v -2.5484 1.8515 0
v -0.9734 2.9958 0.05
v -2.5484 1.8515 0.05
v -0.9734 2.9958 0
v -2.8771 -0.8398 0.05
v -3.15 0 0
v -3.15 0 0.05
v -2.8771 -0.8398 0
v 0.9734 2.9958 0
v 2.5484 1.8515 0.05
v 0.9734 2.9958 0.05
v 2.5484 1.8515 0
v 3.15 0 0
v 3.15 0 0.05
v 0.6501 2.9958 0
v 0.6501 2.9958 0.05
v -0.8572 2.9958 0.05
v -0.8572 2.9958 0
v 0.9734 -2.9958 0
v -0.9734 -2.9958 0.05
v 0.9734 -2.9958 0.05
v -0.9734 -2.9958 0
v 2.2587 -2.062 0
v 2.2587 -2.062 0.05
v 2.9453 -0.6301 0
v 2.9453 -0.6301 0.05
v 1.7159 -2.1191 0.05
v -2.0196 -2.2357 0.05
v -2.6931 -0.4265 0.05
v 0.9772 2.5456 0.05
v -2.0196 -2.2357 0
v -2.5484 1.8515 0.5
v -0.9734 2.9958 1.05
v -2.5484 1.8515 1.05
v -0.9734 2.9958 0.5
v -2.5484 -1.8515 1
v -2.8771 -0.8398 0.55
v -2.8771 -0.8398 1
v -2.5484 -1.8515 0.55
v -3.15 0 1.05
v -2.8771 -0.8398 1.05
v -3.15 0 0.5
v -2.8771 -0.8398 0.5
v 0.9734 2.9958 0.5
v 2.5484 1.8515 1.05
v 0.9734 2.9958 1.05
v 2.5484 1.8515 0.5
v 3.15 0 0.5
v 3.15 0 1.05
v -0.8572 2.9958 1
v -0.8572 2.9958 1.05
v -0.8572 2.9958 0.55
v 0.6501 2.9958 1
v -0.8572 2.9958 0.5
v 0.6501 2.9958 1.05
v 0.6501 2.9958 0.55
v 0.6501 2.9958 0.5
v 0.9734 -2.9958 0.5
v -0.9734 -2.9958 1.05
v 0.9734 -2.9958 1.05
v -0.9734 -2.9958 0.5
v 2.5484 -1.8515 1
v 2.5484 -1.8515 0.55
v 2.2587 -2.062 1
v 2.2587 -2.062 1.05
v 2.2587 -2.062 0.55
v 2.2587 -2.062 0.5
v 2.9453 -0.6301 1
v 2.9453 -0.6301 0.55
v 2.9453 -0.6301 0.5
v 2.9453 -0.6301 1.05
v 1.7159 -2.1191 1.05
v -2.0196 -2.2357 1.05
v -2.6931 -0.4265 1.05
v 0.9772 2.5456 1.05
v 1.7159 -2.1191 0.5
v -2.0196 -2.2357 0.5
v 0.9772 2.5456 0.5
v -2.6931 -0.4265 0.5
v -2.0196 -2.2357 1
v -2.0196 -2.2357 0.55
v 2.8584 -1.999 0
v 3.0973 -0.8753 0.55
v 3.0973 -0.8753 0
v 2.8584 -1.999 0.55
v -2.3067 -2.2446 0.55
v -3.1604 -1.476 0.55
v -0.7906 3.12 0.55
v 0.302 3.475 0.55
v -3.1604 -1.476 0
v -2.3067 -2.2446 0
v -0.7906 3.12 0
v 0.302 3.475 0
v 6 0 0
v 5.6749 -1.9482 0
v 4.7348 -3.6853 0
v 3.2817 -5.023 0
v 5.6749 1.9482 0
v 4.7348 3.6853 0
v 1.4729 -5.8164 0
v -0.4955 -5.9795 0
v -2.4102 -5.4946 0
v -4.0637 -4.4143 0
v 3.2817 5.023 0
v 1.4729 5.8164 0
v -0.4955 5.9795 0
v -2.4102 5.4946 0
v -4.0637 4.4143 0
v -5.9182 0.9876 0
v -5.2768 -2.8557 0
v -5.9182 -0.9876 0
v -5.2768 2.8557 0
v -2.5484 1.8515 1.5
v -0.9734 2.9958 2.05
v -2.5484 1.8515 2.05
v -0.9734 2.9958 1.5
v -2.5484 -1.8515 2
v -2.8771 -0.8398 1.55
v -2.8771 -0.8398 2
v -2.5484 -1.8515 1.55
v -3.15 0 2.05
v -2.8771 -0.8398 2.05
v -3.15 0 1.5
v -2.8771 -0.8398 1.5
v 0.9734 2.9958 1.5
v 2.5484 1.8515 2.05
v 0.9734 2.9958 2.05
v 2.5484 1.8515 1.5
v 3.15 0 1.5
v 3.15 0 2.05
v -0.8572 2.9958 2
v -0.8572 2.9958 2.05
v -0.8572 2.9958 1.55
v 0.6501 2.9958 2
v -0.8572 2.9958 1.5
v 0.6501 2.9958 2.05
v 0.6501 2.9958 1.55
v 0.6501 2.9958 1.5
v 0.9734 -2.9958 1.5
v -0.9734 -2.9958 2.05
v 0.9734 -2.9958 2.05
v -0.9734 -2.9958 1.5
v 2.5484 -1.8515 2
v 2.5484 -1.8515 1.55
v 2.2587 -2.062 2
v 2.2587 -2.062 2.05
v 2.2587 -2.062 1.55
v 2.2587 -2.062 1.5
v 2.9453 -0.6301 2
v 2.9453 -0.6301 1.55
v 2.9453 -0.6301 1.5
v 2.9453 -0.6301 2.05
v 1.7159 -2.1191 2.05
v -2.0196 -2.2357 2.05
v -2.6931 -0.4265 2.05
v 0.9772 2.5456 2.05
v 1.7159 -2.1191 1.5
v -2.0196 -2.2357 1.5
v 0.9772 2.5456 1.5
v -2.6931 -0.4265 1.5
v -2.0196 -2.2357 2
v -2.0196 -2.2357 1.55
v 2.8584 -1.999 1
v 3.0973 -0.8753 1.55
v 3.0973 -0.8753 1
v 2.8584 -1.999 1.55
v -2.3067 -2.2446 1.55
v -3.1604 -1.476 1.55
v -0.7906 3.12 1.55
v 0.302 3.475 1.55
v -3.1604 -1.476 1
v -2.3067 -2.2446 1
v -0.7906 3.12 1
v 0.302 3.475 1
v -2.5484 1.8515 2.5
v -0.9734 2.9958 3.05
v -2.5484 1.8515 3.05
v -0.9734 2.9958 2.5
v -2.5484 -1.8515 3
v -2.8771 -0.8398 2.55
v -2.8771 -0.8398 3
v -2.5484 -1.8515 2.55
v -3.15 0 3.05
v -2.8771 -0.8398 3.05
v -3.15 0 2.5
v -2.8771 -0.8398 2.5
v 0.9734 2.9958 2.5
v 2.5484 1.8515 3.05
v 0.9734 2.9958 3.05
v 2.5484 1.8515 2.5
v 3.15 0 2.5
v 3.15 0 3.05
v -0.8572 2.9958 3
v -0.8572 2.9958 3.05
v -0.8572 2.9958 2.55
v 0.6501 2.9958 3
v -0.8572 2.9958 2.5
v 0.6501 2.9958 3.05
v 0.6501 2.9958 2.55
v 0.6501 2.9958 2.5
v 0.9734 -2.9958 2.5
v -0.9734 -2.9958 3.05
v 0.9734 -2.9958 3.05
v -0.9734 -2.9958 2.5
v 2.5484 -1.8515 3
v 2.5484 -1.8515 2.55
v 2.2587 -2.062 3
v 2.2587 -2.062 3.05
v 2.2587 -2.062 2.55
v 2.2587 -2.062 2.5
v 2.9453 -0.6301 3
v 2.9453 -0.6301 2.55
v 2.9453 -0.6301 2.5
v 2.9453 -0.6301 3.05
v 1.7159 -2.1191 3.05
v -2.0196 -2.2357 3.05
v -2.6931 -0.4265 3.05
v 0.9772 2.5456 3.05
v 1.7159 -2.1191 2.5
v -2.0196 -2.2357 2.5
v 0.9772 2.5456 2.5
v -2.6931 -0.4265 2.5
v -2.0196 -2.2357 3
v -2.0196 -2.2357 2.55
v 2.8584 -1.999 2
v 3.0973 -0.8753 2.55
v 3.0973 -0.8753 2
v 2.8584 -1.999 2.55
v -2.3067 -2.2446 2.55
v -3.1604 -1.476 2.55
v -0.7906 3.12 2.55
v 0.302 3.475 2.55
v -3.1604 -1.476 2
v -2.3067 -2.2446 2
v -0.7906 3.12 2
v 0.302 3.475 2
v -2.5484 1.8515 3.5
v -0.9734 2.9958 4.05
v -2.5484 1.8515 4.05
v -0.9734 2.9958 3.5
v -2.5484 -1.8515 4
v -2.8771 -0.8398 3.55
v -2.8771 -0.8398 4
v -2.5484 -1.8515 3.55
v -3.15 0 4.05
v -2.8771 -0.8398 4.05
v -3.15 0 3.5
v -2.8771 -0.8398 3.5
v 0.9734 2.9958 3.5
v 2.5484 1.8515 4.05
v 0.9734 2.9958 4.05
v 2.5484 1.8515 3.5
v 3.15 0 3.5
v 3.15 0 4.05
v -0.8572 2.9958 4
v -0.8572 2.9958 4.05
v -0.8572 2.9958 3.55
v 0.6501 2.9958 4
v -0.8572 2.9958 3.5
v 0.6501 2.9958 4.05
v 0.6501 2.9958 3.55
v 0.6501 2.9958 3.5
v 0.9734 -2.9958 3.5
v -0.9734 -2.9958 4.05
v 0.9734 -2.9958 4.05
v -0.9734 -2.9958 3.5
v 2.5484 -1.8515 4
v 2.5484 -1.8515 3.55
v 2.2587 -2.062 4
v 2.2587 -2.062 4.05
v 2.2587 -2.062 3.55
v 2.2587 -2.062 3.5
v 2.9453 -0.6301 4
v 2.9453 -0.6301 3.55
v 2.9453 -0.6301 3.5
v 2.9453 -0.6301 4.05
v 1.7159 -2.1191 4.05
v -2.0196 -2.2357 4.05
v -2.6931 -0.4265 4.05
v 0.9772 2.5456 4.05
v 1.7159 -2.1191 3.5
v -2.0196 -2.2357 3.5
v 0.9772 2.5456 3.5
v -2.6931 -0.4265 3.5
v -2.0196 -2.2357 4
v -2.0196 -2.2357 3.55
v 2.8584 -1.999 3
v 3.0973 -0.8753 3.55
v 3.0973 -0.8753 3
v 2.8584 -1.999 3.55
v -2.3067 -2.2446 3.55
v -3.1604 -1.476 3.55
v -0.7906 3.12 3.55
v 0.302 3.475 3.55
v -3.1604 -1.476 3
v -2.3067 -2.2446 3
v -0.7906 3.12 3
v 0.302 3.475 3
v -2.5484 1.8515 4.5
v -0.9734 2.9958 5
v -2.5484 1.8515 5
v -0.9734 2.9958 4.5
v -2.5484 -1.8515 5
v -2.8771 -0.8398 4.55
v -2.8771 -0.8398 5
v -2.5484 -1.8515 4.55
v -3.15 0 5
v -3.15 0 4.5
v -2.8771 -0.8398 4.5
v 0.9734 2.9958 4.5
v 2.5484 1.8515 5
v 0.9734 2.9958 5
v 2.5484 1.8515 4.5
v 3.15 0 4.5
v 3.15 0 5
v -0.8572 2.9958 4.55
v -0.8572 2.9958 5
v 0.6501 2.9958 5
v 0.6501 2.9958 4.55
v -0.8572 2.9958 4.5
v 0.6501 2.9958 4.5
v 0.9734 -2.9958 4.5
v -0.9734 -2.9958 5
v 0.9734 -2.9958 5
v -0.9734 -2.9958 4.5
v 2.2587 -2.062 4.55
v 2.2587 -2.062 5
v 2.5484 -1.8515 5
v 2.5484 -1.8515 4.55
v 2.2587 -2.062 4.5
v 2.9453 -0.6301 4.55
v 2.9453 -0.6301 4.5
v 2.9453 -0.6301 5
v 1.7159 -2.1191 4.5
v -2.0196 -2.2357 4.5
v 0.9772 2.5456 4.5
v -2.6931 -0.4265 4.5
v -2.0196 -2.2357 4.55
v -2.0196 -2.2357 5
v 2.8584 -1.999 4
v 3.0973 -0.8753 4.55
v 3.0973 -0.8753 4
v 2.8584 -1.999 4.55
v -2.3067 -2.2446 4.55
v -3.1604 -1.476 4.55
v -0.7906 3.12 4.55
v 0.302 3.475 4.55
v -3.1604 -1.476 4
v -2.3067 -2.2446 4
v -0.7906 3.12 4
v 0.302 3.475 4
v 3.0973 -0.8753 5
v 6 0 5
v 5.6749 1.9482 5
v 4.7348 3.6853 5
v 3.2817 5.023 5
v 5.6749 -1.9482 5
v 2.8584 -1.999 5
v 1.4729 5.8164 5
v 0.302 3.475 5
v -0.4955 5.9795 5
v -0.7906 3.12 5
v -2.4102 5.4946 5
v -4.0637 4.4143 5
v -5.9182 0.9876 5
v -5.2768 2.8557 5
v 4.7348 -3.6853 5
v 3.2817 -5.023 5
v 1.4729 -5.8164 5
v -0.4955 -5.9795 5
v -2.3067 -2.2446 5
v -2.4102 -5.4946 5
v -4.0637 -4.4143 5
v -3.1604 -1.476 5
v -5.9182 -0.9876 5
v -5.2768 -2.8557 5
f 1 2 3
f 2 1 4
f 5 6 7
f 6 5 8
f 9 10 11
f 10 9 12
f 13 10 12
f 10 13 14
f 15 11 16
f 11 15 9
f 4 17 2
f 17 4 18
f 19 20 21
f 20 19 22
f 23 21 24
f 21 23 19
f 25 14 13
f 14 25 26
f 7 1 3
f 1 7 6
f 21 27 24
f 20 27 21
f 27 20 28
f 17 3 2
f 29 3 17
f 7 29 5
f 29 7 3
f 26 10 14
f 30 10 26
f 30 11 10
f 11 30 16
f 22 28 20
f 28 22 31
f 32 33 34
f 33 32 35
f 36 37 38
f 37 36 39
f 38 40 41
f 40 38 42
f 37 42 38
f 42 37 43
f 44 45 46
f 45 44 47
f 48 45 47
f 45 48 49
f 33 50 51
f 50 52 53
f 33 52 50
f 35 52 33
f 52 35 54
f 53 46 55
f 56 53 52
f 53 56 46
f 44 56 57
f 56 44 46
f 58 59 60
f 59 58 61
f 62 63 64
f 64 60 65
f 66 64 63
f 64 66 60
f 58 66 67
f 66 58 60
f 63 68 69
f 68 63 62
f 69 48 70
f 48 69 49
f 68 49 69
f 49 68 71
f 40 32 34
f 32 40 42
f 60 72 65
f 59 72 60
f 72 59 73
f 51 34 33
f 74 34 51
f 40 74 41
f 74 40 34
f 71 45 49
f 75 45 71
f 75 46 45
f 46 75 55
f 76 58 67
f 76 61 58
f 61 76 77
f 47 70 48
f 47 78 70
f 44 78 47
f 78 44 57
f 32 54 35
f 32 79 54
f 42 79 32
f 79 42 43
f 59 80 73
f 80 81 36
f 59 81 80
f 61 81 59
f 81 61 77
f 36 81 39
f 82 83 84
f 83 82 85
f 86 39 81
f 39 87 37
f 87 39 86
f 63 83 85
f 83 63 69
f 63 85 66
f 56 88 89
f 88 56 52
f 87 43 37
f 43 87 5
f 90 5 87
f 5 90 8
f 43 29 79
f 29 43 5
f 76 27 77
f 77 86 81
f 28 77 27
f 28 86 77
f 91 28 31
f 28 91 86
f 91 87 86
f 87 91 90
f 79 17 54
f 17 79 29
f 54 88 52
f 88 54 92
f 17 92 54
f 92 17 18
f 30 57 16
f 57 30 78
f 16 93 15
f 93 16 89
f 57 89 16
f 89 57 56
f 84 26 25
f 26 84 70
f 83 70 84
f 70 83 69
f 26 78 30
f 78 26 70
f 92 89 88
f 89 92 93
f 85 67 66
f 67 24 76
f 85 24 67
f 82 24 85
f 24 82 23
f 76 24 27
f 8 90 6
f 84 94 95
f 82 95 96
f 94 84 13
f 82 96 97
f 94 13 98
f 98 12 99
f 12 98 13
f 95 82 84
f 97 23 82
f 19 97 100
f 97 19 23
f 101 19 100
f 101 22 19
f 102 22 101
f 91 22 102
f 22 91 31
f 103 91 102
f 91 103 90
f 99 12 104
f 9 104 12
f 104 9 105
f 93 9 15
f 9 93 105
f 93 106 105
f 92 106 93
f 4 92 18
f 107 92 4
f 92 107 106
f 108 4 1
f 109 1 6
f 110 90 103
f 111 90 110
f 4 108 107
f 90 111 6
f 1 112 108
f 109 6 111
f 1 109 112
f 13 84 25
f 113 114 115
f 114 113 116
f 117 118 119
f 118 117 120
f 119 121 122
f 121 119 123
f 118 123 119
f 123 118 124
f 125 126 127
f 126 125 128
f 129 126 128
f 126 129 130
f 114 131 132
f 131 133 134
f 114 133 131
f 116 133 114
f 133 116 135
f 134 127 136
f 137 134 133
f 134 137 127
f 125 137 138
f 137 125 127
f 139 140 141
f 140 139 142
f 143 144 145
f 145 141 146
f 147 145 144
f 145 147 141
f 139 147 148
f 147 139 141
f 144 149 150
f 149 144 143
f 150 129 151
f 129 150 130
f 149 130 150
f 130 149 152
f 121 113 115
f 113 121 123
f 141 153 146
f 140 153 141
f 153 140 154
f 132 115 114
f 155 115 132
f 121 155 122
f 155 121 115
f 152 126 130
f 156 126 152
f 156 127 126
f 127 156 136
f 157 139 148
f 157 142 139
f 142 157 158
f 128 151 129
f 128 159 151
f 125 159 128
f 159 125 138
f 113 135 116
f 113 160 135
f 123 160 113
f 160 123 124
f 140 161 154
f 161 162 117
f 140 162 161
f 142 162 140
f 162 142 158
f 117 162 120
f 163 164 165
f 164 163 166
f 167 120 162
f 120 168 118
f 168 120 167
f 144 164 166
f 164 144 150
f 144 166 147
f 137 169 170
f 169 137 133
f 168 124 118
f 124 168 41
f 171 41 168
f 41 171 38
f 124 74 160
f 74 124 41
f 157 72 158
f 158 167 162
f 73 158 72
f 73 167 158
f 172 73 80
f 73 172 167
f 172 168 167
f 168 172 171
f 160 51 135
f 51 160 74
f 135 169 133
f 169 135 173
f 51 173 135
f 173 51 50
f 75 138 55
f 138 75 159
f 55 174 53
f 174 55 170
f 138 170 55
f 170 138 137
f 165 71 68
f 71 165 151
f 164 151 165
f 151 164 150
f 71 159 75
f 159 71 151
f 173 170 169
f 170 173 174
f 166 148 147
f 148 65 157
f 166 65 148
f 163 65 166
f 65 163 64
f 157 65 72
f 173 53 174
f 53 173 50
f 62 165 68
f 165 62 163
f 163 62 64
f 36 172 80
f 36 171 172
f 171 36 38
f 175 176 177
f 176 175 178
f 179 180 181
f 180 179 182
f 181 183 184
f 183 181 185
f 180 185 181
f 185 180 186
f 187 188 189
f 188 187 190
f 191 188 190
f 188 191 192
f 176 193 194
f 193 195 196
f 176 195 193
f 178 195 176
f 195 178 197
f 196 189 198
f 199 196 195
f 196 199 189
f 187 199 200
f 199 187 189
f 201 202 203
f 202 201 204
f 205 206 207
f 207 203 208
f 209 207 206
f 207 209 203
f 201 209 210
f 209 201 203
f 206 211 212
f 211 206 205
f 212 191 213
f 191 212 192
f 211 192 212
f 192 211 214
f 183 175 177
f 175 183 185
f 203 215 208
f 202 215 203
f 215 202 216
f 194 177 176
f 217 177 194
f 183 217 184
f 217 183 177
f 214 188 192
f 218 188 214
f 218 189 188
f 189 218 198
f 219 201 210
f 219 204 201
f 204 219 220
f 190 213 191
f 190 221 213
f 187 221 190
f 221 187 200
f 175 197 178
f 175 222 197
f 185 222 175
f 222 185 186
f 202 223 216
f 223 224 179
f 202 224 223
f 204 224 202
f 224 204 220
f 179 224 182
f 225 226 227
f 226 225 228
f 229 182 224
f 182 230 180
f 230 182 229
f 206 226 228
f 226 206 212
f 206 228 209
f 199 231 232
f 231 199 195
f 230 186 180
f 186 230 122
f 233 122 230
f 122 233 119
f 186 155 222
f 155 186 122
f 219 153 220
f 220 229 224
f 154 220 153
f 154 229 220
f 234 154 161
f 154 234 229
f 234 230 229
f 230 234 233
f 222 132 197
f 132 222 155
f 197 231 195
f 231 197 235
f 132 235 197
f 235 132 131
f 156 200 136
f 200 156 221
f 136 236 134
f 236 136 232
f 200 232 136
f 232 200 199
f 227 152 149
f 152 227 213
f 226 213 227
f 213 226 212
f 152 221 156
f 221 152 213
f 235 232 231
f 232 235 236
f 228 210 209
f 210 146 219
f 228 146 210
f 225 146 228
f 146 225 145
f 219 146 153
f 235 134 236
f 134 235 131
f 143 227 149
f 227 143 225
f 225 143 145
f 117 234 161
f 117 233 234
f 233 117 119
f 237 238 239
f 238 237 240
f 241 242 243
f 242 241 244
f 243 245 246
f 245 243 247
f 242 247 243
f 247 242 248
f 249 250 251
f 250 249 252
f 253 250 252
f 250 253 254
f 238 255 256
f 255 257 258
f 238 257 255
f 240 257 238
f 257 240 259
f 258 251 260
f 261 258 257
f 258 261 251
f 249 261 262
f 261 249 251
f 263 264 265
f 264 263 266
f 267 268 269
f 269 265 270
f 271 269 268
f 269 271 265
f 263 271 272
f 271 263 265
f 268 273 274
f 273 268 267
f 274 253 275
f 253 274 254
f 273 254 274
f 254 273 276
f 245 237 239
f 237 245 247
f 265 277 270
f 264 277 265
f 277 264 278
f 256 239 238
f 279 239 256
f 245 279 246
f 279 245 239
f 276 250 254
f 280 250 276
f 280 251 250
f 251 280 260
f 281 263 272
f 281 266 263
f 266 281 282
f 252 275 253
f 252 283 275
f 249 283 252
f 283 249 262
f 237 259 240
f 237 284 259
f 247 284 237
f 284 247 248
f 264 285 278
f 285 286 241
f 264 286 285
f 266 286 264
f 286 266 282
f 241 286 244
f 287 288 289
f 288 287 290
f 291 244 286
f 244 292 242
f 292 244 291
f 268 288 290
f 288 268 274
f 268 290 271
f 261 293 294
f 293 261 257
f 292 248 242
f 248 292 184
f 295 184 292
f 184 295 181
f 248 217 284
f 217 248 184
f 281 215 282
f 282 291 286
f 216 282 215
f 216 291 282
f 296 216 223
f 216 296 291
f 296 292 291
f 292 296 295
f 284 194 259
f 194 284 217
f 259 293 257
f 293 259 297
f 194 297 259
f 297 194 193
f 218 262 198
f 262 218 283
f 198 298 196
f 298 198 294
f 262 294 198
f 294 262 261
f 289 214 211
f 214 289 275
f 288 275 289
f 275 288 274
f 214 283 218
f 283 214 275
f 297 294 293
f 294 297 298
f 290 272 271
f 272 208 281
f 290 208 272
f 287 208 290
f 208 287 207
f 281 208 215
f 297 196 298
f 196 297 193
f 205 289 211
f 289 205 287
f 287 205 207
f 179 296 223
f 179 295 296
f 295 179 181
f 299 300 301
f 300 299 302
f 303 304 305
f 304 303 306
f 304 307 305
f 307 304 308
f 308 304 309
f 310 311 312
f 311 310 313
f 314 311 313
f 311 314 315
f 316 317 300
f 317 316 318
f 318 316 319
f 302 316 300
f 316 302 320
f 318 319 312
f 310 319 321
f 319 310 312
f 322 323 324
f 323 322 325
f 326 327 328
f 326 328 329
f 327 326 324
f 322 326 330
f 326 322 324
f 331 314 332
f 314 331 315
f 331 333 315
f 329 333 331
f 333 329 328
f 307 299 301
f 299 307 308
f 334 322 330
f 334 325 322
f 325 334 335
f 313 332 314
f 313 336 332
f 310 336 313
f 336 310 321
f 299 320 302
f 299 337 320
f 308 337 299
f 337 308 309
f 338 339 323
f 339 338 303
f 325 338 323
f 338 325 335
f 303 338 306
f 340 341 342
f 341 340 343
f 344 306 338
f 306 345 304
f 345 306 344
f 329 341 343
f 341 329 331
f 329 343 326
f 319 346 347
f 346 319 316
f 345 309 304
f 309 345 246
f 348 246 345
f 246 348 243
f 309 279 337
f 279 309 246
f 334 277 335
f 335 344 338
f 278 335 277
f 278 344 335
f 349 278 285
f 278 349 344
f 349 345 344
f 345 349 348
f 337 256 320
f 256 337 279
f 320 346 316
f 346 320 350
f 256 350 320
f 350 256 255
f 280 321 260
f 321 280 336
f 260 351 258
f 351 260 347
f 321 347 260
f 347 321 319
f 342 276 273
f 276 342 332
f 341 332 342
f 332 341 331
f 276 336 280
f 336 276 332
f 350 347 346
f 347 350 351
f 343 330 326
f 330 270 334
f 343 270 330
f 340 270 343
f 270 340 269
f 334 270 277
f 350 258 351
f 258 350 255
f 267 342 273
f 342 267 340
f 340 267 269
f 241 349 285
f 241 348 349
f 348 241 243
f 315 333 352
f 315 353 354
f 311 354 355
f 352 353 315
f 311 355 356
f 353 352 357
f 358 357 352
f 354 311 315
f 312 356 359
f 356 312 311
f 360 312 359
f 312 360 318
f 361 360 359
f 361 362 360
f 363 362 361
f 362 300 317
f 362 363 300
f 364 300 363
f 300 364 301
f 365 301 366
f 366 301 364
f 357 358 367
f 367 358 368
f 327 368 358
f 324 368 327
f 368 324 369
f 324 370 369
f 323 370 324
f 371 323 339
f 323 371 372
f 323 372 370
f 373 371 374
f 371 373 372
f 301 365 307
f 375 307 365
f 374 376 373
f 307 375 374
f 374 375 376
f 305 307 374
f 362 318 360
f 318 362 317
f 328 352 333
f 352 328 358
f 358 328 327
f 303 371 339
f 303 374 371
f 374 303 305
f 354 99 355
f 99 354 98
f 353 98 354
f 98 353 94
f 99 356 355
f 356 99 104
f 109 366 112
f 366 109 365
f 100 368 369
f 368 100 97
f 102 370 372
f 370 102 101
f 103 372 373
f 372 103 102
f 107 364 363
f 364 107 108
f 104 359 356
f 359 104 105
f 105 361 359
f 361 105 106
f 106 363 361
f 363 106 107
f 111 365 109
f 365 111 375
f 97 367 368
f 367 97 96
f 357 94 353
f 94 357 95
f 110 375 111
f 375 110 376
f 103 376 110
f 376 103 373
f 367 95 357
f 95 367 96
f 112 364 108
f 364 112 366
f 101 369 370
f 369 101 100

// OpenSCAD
/******************************************************************
*                                                                 *
* OpenFlexure Microscope: OpenSCAD Utility functions              *
*                                                                 *
* This is part of the OpenFlexure microscope, an open-source      *
* microscope and 3-axis translation stage.  It gets really good   *
* precision over a ~10mm range, by using plastic flexure          *
* mechanisms.                                                     *
*                                                                 *
* (c) Richard Bowman, January 2016                                *
* Released under the CERN Open Hardware License                   *
*                                                                 *
******************************************************************/


//utilities

d=0.05;

function zeroz(size) = [size[0], size[1], 0]; //set the Z component of a 3-vector to 0

module reflect(axis){ //reflects its children about the origin, but keeps the originals
	children();
	mirror(axis) children();
}
module repeat(delta,N,center=false){ //repeat something along a regular array
	translate( (center ?  -(N-1)/2 : 0) * delta)
				for(i=[0:1:(N-1)]) translate(i*delta) children();
}

module nut(d,h=-1,center=false,fudge=1.18,shaft=false){ //make a nut, for metric bolt of nominal diameter d
	//d: nominal bolt diameter (e.g. 3 for M3)
	//h: height of nut
	//center: works as for cylinder
	//fudge: multiply the diameter by this number (1.22 works when vertical)
	//shaft: include a long cylinder representing the bolt shaft, diameter=d*1.05
	h=(h<0)?d*0.8:h;
    union(){
		cylinder(h=h,center=center,r=0.9*d*fudge,$fn=6); 
		if(shaft){
			reflect([0,0,1]) cylinder(r=d/2*1.05*(fudge+1)/2,h=99999999999,$fn=16); 
			//the reason I reflect rather than use center=true is that the latter 
			//fails in fast preview mode (I guess because of the lack of points 
			//inside the nut).  Also, less fudge is applied to the shaft, it can
			//always be fixed with a drill after all...
		}
	}
}
module nut_from_bottom(d,h=-1,fudge=1.2,shaft=true,chamfer_r=0.75,chamfer_h=0.75){ //make a nut, for metric bolt of nominal diameter d
	//d: nominal bolt diameter (e.g. 3 for M3)
	//h: height of nut
	//center: works as for cylinder
	//fudge: multiply the diameter by this number (1.22 works when vertical)
	//shaft: include a long cylinder representing the bolt shaft, diameter=d*1.05
	h=(h<0)?d*0.8:h;
    union(){
		cylinder(h=h,r=0.9*d*fudge,$fn=6); 
		translate([0,0,-0.05]) cylinder(h=chamfer_h,r1=0.9*d*fudge+chamfer_r,r2=0.9*d*fudge,$fn=6); 
		mirror([0,0,1]) cylinder(h=9999,r=0.9*d*fudge+chamfer_r,$fn=6); 
		if(shaft){
             sr=d/2*1.05*(fudge+1)/2; //radius of shaft
			translate([0,0,h/2]) reflect([0,0,1]) cylinder(r=sr,h=99999999999,$fn=16); 
			//the reason I reflect rather than use center=true is that the latter 
			//fails in fast preview mode (I guess because of the lack of points 
			//inside the nut).  Also, less fudge is applied to the shaft, it can
			//always be fixed with a drill after all...
			intersection(){ //we add a little cut to the roof of the surface so the initial bridges don't have to span the hole.
				union(){
					translate([0,0,h]) cube([9999,sr*2,0.5],center=true);
					translate([0,0,h+0.25]) cube([sr*2,sr*2,0.5],center=true);
				}
				cylinder(h=h+1,r=0.9*d*fudge,$fn=6); 
			}
		}
	}
}
//nut_from_bottom(4,chamfer_h=4,h=7);

module nut_y(d,h=-1,center=false,fudge=1.15,extra_height=0.7,shaft=false,top_access=false){ //make a nut, for metric bolt of nominal diameter d
	//d: nominal bolt diameter (e.g. 3 for M3)
	//h: height of nut
	//center: works as for cylinder
	//fudge: multiply the diameter by this number (1.22 works when vertical)
	//shaft: include a long cylinder representing the bolt shaft, diameter=d*1.05
    //top_access: extend the nut upwards to allow it to drop in.
	h=(h<0)?d*0.8:h;
    r=0.9*d*fudge;
    union(){
		rotate([-90,top_access?30:0,0]) cylinder(h=h,center=center,r=r,$fn=6);
		translate([-r*sin(30),center?-h/2:0,0]) cube([2*r*sin(30),h,r*cos(30)+extra_height]);
		if(shaft){
			translate([0,h/2,0]) reflect([0,1,0]) cylinder_with_45deg_top(h=999999,r=d/2*1.05*fudge,$fn=16,extra_height=extra_height); 
			//the reason I reflect rather than use center=true is that the latter 
			//fails in fast preview mode (I guess because of the lack of points 
			//inside the nut).
		}
        if(top_access){ //hole from the top
            translate([-r*cos(30),center?-h/2:0,0]) cube([2*r*cos(30),h,9999]);
        }
	}
}
module screw_y(d,h=-1,center=false,fudge=1.05,extra_height=0.7,shaft=false,shaft_length=999999){ //make a nut, for metric bolt of nominal diameter d
	//d: nominal bolt diameter (e.g. 3 for M3)
	//h: height of nut
	//center: works as for cylinder
	//fudge: multiply the diameter by this number (1.22 works when vertical)
	//shaft: include a long cylinder representing the bolt shaft, diameter=d*1.05
	h=(h<0)?d*0.8:h; //height of screw head
    r=0.9*d*fudge; //radius of screw head
    union(){
		cylinder_with_45deg_top(h=h,r=d*1.05*fudge,$fn=16,extra_height=extra_height); 
		if(shaft){
			translate([0,center ? 0 : h/2,0]) reflect([0,1,0]) cylinder_with_45deg_top(h=shaft_length+h/2,r=d/2*1.05*fudge,$fn=16,extra_height=extra_height); 
			//the reason I reflect rather than use center=true is that the latter 
			//fails in fast preview mode (I guess because of the lack of points 
			//inside the nut).
		}
	}
}
//screw_y(4,shaft=true, shaft_length=10);
module pinch_y(d, screw_l=999, counterbore_l=999, nut_l=-1, gap=[], t=2,extra_height=0.7,top_access=false){
    //gap with a nut/bolt to squeeze it
    nut_l = nut_l<0 ? d : nut_l; //default nut height
    gap = len(gap)==3 ? gap : [4*d, d, 4*d];
    union(){
        translate([0,gap[1]/2+t]) screw_y(d,h=counterbore_l,shaft=true,shaft_length=2*screw_l,extra_height=extra_height);
        cube(gap,center=true);
        translate([0,-gap[1]/2-t]) mirror([0,1,0]) nut_y(d, h=nut_l,center=false,shaft=false,top_access=top_access);
    }
}
//pinch_y(4,screw_l=10,t=4,top_access=true);

module chamfered_hole(r=10, h=10, chamfer=1,center=false){
    translate([0,0, center ? -h/2 : 0]) union(){
        translate([0,0,-d]) cylinder(r1=r+chamfer+d,r2=r,h=chamfer+d);
        cylinder(r=r,h=h);
        translate([0,0,h-chamfer]) cylinder(r1=r,r2=r+chamfer+d,h=chamfer+d);
    }
}
//chamfered_hole(15,30,center=true);

module unrotate(rotation){
	//undo a previous rotation, NB this is NOT the same as rotate(-rotation) due to ordering.
	rotate([0,0,-rotation[2]]) rotate([0,-rotation[1],0]) rotate([-rotation[0],0,0]) children();
}

module smatrix(xx=1,yy=1,zz=1,xy=0,xz=0,yx=0,yz=0,zx=0,zy=0, xt=0, yt=0, zt=0){
    //apply a matrix transformation, specifying the matrix sparsely
    //this is useful because most helpful matrices are close to the identity.
    multmatrix([[xx, xy, xz, xt],
                [yx, yy, yz, yt],
                [zx, zy, zz, zt],
                [0,  0,  0,  1]]) children();
}

module support(size, height, baseheight=0, rotation=[0,0,0], supportangle=45, outline=false){
	//generate "support material" in the STL file for selective supporting of things
	module support_2d(){
        sw=1.0;
        sp=3;
		union(){
			if(outline){
				difference()	{
					minkowski(){
						children();
						circle(r=sw,$fn=8);
					}
					children();
				}
			}
			intersection(){
				children();
				rotate(supportangle) for(x=[-size:sp:size])
					translate([x,0]) square([sw,2*size],center=true);
			}
		}
	}
	
	unrotate(rotation){
		translate([0,0,baseheight]) linear_extrude(height) support_2d() projection() rotate(rotation) children();
	}
	children();
}

module rightangle_prism(size,center=false){
	intersection(){
		cube(size,center=center);
		rotate([0,45,0]) translate([9999/2,0,0]) cube([1,1,1]*9999,center=true);
	}
}

module sequential_hull(){
	//given a sequence of >2 children, take the convex hull between each pair - a helpful, general extrusion technique.
	for(i=[0:$children-2]){
		hull(){
			children(i);
			children(i+1);
		}
	}
}

module union_preserving_holes(){
	//given a number of children, return the union of them, but preserve holes in each part
	difference(){
		union(){  //the union of all the parts
			children();
		}
		union(){ //the union of all the holes
			for(i=[0:$children-1]){
				difference(){
					hull() children(i);
					children(i);
				}
			}
		}
	}
}

module cylinder_with_45deg_top(h,r,center=false,extra_height=0.7,$fn=$fn){
	union(){
		rotate([90,0,180]) hull(){
			cylinder(h=h,r=r,$fn=$fn,center=center);
			translate([0,r-0.001,center?0:h/2]) cube([2*sin(45/2)*r,0.002,h],center=true);
		}
		rotate([90,0,180]) translate([0,r-0.001,(center?0:h/2)]) cube([2*sin(45/2)*r,0.002+2*extra_height,h],center=true);
	}
}

module feather_vertical_edges(flat_h=0.2,fin_r=0.5,fin_h=0.72,object_h=20){
	union(){
	//	children();
		minkowski(){
			intersection(){
				children();
				union() for(i=[-floor(object_h/fin_h):floor(object_h/fin_h)]) translate([0,0,i*fin_h+flat_h*1.5]) cube([9999,9999,flat_h],center=true);
			}
			cylinder(r1=0,r2=fin_r,h=fin_h-2*flat_h,$fn=8);
		}
	}
}

module square_to_circle(r, h, layers=4, top_cylinder=0){
    // A stack of thin shapes, starting as a square and
    // gradually gaining sides to turn into a cylinder
    sides=[4,8,16,32,64,128,256]; //number of sides
    for(i=[0:(layers-1)]) rotate(180/sides[i]) 
        translate([0,0,i*h/layers]) cylinder(r=r/cos(180/sides[i]),h=h/layers+d,$fn=sides[i]);
    if(top_cylinder>0) cylinder(r=r,h=h+top_cylinder, $fn=sides[layers-1]);
}

module hole_from_bottom(r, h, base_w=-1, dz=0.5, big_bottom=true){
    // This creates a cut-out that can be used to make a hole in a large
    // bridge, without too much spaghetti!
    base = base_w>0 ? [base_w,2*r,2*dz] : [2*r,2*r,d];
    union(){
        translate([0,0,0]) cube(base,center=true);
        translate([0,0,base[2]/2-d]) square_to_circle(r, dz*4, 4, h-dz*5+d);
        if(big_bottom) mirror([0,0,1]) cylinder(r=999,h=999,$fn=8);
    }
}

//hole_from_bottom(3, 10, base_w=12);


module lighttrap_cylinder(r1,r2,h,ridge=1.5){
    //A "cylinder" made up of christmas-tree-like cones
    //good for trapping light in an optical path
    //r1 is the outer radius of the bottom
    //r2 is the inner radius of the top
    //NB for a straight-sided cylinder, r2==r1-ridge
    n_cones = floor(h/ridge);
    cone_h = h/n_cones;
    
	for(i = [0 : n_cones - 1]){
        p = i/(n_cones - 1);
		translate([0, 0, i * cone_h - d]) 
			cylinder(r1=(1-p)*r1 + p*(r2+ridge),
					r2=(1-p)*(r1-ridge) + p*r2,
					h=cone_h+2*d);
    }
}
module lighttrap_sqylinder(r1,f1,r2,f2,h,ridge=1.5){
    //A "cylinder" made up of christmas-tree-like cones
    //good for trapping light in an optical path
    //r1 is the outer radius of the bottom
    //f1 is the outer flat length of the bottom (f1=0 makes the bottom circular)
    //r2 is the inner radius of the top
    //f2 is the inner flat length of the top (f2=0 makes it circular)
    //NB for a straight-sided cylinder, r2==r1-ridge
    //Also, the ridges are made by varying r, not f.  This means there's a minimum r1
    //which is the value of ridge.
    n_cones = floor(h/ridge);
    cone_h = h/n_cones;
    
	for(i = [0 : n_cones - 1]){
        p = i/(n_cones - 1);
		translate([0, 0, i * cone_h - d]) 
			minkowski(){
                cylinder(r1=(1-p)*r1 + p*(r2+ridge),
					r2=(1-p)*(r1-ridge) + p*r2,
					h=cone_h);
                cube([1,1,0]*((1-p)*f1 + p*f2) + [0,0,2*d], center=true);
            }
    }
}


module add_hull_base(h=1){
    // Take the convex hull of some objects, and add it in as a
    // thin layer at the bottom
    union(){
        intersection(){
            hull() children();
            cylinder(r=9999,$fn=8,h=h); //make the base thin
        }
        children();
    }
}
module add_roof(inner_h){
    // Take the convex hull of some objects, and add the top
    // of it as a roof.  NB you must specify the height of
    // the underside of the roof - finding it automatically
    // would be too much work...
    union(){
        difference(){
            hull() children();
            cylinder(r=9999,$fn=8,h=inner_h);
        }
        children();
    }
}

module trylinder(r=1, flat=1, h=d, center=false){
    //Halfway between a cylinder and a triangle.
    //NB the largest cylinder that fits inside it has r=r+f/(2*sqrt(3))
    hull() for(a=[0,120,240]) rotate(a)
        translate([0,flat/sqrt(3),0]) cylinder(r=r, h=h, center=center);
}
module trylinder_gripper(inner_r=10,h=6,grip_h=3.5,base_r=-1,t=0.65,squeeze=1,flare=0.8,solid=false){
    // This creates a tapering, distorted hollow cylinder suitable for
    // gripping a small cylindrical (or spherical) object
    // The gripping occurs grip_h above the base, and it flares out
    // again both above and below this.
    // inner_r: radius of the cylinder we're gripping
    // h: overall height of the gripper
    // grip_h: height of the part where the gripper touches the cylinder
    // base_r: radius of the (cylindrical) bottom
    // t: thickness of the walls
    // squeeze: how far the wall must be distorted to fit the cylinder
    // flare: how much larger the top is than the gripping part
    // solid: if true, make a solid outline of the gripper
    $fn=48;
    bottom_r=base_r>0?base_r:inner_r+1+t;
    difference(){
        sequential_hull(){
            translate([0,0,0]) cylinder(r=bottom_r,h=d);
            translate([0,0,grip_h-0.5]) trylinder(r=inner_r-squeeze+t,flat=2.5*squeeze,h=d);
            translate([0,0,grip_h+0.5]) trylinder(r=inner_r-squeeze+t,flat=2.5*squeeze,h=d);
            translate([0,0,h-d]) trylinder(r=inner_r-squeeze+flare+t,flat=2.5*squeeze,h=d);
        }
        if(solid==false) sequential_hull(){
            translate([0,0,-d]) cylinder(r=bottom_r-t,h=d);
            translate([0,0,grip_h-0.5]) trylinder(r=inner_r-squeeze,flat=2.5*squeeze,h=d);
            translate([0,0,grip_h+0.5]) trylinder(r=inner_r-squeeze,flat=2.5*squeeze,h=d);
            translate([0,0,h]) trylinder(r=inner_r-squeeze+flare,flat=2.5*squeeze,h=d);
        }
    }
}

module deformable_hole_trylinder(r1, r2, h=99, corner_roc=-1, dz=0.5, center=false){
    // A cylinder with feathered edges, to make a hole that is
    // slightly deformable, in an otherwise rigid structure.
    // r1: inner radius
    // r2: outer radius
    // h, center: as for cylinder
    // corner_roc: radius of curvature of the trylinder
    // dz: thickness of layers
    n = floor(h/(2*dz)); //number of layers in the structure
    flat_l = 2*sqrt(r2*r2 - r1*r1);
    corner_roc = corner_roc < 0 ? r1 - flat_l/(2*sqrt(3)) : corner_roc;
    repeat([0,0,2*dz], n, center=center) union(){
        cylinder(r=r2, h=dz+d);
        translate([0,0,center ? -dz : dz]) trylinder(r=corner_roc, flat=flat_l, h=dz+d);
    }
}
difference(){
    cylinder(r=6, h=5);
    deformable_hole_trylinder(4.5/2,6.3/2,h=20, center=true);
}

//trylinder_gripper();
//feather_vertical_edges(fin_r=1){
//	cylinder(r=12,h=10);
//}

//cylinder_with_45deg_top(20,10,center=false,$fn=32,extra_height=0.5);

//$fn=12;
//sequential_hull(){
//	translate([0,0,0]) sphere(r=.2);
//	translate([0,1,0]) sphere(r=.2);
//	translate([0,1,1]) sphere(r=.2);
//	translate([1,1,1]) sphere(r=.2);
//}

//nut(3,shaft=true);

//rightangle_prism([1,1,1],center=true);

//support(50,20,baseheight=-20,rotation=[90,0,0]) sphere(r=8,$fn=16);
